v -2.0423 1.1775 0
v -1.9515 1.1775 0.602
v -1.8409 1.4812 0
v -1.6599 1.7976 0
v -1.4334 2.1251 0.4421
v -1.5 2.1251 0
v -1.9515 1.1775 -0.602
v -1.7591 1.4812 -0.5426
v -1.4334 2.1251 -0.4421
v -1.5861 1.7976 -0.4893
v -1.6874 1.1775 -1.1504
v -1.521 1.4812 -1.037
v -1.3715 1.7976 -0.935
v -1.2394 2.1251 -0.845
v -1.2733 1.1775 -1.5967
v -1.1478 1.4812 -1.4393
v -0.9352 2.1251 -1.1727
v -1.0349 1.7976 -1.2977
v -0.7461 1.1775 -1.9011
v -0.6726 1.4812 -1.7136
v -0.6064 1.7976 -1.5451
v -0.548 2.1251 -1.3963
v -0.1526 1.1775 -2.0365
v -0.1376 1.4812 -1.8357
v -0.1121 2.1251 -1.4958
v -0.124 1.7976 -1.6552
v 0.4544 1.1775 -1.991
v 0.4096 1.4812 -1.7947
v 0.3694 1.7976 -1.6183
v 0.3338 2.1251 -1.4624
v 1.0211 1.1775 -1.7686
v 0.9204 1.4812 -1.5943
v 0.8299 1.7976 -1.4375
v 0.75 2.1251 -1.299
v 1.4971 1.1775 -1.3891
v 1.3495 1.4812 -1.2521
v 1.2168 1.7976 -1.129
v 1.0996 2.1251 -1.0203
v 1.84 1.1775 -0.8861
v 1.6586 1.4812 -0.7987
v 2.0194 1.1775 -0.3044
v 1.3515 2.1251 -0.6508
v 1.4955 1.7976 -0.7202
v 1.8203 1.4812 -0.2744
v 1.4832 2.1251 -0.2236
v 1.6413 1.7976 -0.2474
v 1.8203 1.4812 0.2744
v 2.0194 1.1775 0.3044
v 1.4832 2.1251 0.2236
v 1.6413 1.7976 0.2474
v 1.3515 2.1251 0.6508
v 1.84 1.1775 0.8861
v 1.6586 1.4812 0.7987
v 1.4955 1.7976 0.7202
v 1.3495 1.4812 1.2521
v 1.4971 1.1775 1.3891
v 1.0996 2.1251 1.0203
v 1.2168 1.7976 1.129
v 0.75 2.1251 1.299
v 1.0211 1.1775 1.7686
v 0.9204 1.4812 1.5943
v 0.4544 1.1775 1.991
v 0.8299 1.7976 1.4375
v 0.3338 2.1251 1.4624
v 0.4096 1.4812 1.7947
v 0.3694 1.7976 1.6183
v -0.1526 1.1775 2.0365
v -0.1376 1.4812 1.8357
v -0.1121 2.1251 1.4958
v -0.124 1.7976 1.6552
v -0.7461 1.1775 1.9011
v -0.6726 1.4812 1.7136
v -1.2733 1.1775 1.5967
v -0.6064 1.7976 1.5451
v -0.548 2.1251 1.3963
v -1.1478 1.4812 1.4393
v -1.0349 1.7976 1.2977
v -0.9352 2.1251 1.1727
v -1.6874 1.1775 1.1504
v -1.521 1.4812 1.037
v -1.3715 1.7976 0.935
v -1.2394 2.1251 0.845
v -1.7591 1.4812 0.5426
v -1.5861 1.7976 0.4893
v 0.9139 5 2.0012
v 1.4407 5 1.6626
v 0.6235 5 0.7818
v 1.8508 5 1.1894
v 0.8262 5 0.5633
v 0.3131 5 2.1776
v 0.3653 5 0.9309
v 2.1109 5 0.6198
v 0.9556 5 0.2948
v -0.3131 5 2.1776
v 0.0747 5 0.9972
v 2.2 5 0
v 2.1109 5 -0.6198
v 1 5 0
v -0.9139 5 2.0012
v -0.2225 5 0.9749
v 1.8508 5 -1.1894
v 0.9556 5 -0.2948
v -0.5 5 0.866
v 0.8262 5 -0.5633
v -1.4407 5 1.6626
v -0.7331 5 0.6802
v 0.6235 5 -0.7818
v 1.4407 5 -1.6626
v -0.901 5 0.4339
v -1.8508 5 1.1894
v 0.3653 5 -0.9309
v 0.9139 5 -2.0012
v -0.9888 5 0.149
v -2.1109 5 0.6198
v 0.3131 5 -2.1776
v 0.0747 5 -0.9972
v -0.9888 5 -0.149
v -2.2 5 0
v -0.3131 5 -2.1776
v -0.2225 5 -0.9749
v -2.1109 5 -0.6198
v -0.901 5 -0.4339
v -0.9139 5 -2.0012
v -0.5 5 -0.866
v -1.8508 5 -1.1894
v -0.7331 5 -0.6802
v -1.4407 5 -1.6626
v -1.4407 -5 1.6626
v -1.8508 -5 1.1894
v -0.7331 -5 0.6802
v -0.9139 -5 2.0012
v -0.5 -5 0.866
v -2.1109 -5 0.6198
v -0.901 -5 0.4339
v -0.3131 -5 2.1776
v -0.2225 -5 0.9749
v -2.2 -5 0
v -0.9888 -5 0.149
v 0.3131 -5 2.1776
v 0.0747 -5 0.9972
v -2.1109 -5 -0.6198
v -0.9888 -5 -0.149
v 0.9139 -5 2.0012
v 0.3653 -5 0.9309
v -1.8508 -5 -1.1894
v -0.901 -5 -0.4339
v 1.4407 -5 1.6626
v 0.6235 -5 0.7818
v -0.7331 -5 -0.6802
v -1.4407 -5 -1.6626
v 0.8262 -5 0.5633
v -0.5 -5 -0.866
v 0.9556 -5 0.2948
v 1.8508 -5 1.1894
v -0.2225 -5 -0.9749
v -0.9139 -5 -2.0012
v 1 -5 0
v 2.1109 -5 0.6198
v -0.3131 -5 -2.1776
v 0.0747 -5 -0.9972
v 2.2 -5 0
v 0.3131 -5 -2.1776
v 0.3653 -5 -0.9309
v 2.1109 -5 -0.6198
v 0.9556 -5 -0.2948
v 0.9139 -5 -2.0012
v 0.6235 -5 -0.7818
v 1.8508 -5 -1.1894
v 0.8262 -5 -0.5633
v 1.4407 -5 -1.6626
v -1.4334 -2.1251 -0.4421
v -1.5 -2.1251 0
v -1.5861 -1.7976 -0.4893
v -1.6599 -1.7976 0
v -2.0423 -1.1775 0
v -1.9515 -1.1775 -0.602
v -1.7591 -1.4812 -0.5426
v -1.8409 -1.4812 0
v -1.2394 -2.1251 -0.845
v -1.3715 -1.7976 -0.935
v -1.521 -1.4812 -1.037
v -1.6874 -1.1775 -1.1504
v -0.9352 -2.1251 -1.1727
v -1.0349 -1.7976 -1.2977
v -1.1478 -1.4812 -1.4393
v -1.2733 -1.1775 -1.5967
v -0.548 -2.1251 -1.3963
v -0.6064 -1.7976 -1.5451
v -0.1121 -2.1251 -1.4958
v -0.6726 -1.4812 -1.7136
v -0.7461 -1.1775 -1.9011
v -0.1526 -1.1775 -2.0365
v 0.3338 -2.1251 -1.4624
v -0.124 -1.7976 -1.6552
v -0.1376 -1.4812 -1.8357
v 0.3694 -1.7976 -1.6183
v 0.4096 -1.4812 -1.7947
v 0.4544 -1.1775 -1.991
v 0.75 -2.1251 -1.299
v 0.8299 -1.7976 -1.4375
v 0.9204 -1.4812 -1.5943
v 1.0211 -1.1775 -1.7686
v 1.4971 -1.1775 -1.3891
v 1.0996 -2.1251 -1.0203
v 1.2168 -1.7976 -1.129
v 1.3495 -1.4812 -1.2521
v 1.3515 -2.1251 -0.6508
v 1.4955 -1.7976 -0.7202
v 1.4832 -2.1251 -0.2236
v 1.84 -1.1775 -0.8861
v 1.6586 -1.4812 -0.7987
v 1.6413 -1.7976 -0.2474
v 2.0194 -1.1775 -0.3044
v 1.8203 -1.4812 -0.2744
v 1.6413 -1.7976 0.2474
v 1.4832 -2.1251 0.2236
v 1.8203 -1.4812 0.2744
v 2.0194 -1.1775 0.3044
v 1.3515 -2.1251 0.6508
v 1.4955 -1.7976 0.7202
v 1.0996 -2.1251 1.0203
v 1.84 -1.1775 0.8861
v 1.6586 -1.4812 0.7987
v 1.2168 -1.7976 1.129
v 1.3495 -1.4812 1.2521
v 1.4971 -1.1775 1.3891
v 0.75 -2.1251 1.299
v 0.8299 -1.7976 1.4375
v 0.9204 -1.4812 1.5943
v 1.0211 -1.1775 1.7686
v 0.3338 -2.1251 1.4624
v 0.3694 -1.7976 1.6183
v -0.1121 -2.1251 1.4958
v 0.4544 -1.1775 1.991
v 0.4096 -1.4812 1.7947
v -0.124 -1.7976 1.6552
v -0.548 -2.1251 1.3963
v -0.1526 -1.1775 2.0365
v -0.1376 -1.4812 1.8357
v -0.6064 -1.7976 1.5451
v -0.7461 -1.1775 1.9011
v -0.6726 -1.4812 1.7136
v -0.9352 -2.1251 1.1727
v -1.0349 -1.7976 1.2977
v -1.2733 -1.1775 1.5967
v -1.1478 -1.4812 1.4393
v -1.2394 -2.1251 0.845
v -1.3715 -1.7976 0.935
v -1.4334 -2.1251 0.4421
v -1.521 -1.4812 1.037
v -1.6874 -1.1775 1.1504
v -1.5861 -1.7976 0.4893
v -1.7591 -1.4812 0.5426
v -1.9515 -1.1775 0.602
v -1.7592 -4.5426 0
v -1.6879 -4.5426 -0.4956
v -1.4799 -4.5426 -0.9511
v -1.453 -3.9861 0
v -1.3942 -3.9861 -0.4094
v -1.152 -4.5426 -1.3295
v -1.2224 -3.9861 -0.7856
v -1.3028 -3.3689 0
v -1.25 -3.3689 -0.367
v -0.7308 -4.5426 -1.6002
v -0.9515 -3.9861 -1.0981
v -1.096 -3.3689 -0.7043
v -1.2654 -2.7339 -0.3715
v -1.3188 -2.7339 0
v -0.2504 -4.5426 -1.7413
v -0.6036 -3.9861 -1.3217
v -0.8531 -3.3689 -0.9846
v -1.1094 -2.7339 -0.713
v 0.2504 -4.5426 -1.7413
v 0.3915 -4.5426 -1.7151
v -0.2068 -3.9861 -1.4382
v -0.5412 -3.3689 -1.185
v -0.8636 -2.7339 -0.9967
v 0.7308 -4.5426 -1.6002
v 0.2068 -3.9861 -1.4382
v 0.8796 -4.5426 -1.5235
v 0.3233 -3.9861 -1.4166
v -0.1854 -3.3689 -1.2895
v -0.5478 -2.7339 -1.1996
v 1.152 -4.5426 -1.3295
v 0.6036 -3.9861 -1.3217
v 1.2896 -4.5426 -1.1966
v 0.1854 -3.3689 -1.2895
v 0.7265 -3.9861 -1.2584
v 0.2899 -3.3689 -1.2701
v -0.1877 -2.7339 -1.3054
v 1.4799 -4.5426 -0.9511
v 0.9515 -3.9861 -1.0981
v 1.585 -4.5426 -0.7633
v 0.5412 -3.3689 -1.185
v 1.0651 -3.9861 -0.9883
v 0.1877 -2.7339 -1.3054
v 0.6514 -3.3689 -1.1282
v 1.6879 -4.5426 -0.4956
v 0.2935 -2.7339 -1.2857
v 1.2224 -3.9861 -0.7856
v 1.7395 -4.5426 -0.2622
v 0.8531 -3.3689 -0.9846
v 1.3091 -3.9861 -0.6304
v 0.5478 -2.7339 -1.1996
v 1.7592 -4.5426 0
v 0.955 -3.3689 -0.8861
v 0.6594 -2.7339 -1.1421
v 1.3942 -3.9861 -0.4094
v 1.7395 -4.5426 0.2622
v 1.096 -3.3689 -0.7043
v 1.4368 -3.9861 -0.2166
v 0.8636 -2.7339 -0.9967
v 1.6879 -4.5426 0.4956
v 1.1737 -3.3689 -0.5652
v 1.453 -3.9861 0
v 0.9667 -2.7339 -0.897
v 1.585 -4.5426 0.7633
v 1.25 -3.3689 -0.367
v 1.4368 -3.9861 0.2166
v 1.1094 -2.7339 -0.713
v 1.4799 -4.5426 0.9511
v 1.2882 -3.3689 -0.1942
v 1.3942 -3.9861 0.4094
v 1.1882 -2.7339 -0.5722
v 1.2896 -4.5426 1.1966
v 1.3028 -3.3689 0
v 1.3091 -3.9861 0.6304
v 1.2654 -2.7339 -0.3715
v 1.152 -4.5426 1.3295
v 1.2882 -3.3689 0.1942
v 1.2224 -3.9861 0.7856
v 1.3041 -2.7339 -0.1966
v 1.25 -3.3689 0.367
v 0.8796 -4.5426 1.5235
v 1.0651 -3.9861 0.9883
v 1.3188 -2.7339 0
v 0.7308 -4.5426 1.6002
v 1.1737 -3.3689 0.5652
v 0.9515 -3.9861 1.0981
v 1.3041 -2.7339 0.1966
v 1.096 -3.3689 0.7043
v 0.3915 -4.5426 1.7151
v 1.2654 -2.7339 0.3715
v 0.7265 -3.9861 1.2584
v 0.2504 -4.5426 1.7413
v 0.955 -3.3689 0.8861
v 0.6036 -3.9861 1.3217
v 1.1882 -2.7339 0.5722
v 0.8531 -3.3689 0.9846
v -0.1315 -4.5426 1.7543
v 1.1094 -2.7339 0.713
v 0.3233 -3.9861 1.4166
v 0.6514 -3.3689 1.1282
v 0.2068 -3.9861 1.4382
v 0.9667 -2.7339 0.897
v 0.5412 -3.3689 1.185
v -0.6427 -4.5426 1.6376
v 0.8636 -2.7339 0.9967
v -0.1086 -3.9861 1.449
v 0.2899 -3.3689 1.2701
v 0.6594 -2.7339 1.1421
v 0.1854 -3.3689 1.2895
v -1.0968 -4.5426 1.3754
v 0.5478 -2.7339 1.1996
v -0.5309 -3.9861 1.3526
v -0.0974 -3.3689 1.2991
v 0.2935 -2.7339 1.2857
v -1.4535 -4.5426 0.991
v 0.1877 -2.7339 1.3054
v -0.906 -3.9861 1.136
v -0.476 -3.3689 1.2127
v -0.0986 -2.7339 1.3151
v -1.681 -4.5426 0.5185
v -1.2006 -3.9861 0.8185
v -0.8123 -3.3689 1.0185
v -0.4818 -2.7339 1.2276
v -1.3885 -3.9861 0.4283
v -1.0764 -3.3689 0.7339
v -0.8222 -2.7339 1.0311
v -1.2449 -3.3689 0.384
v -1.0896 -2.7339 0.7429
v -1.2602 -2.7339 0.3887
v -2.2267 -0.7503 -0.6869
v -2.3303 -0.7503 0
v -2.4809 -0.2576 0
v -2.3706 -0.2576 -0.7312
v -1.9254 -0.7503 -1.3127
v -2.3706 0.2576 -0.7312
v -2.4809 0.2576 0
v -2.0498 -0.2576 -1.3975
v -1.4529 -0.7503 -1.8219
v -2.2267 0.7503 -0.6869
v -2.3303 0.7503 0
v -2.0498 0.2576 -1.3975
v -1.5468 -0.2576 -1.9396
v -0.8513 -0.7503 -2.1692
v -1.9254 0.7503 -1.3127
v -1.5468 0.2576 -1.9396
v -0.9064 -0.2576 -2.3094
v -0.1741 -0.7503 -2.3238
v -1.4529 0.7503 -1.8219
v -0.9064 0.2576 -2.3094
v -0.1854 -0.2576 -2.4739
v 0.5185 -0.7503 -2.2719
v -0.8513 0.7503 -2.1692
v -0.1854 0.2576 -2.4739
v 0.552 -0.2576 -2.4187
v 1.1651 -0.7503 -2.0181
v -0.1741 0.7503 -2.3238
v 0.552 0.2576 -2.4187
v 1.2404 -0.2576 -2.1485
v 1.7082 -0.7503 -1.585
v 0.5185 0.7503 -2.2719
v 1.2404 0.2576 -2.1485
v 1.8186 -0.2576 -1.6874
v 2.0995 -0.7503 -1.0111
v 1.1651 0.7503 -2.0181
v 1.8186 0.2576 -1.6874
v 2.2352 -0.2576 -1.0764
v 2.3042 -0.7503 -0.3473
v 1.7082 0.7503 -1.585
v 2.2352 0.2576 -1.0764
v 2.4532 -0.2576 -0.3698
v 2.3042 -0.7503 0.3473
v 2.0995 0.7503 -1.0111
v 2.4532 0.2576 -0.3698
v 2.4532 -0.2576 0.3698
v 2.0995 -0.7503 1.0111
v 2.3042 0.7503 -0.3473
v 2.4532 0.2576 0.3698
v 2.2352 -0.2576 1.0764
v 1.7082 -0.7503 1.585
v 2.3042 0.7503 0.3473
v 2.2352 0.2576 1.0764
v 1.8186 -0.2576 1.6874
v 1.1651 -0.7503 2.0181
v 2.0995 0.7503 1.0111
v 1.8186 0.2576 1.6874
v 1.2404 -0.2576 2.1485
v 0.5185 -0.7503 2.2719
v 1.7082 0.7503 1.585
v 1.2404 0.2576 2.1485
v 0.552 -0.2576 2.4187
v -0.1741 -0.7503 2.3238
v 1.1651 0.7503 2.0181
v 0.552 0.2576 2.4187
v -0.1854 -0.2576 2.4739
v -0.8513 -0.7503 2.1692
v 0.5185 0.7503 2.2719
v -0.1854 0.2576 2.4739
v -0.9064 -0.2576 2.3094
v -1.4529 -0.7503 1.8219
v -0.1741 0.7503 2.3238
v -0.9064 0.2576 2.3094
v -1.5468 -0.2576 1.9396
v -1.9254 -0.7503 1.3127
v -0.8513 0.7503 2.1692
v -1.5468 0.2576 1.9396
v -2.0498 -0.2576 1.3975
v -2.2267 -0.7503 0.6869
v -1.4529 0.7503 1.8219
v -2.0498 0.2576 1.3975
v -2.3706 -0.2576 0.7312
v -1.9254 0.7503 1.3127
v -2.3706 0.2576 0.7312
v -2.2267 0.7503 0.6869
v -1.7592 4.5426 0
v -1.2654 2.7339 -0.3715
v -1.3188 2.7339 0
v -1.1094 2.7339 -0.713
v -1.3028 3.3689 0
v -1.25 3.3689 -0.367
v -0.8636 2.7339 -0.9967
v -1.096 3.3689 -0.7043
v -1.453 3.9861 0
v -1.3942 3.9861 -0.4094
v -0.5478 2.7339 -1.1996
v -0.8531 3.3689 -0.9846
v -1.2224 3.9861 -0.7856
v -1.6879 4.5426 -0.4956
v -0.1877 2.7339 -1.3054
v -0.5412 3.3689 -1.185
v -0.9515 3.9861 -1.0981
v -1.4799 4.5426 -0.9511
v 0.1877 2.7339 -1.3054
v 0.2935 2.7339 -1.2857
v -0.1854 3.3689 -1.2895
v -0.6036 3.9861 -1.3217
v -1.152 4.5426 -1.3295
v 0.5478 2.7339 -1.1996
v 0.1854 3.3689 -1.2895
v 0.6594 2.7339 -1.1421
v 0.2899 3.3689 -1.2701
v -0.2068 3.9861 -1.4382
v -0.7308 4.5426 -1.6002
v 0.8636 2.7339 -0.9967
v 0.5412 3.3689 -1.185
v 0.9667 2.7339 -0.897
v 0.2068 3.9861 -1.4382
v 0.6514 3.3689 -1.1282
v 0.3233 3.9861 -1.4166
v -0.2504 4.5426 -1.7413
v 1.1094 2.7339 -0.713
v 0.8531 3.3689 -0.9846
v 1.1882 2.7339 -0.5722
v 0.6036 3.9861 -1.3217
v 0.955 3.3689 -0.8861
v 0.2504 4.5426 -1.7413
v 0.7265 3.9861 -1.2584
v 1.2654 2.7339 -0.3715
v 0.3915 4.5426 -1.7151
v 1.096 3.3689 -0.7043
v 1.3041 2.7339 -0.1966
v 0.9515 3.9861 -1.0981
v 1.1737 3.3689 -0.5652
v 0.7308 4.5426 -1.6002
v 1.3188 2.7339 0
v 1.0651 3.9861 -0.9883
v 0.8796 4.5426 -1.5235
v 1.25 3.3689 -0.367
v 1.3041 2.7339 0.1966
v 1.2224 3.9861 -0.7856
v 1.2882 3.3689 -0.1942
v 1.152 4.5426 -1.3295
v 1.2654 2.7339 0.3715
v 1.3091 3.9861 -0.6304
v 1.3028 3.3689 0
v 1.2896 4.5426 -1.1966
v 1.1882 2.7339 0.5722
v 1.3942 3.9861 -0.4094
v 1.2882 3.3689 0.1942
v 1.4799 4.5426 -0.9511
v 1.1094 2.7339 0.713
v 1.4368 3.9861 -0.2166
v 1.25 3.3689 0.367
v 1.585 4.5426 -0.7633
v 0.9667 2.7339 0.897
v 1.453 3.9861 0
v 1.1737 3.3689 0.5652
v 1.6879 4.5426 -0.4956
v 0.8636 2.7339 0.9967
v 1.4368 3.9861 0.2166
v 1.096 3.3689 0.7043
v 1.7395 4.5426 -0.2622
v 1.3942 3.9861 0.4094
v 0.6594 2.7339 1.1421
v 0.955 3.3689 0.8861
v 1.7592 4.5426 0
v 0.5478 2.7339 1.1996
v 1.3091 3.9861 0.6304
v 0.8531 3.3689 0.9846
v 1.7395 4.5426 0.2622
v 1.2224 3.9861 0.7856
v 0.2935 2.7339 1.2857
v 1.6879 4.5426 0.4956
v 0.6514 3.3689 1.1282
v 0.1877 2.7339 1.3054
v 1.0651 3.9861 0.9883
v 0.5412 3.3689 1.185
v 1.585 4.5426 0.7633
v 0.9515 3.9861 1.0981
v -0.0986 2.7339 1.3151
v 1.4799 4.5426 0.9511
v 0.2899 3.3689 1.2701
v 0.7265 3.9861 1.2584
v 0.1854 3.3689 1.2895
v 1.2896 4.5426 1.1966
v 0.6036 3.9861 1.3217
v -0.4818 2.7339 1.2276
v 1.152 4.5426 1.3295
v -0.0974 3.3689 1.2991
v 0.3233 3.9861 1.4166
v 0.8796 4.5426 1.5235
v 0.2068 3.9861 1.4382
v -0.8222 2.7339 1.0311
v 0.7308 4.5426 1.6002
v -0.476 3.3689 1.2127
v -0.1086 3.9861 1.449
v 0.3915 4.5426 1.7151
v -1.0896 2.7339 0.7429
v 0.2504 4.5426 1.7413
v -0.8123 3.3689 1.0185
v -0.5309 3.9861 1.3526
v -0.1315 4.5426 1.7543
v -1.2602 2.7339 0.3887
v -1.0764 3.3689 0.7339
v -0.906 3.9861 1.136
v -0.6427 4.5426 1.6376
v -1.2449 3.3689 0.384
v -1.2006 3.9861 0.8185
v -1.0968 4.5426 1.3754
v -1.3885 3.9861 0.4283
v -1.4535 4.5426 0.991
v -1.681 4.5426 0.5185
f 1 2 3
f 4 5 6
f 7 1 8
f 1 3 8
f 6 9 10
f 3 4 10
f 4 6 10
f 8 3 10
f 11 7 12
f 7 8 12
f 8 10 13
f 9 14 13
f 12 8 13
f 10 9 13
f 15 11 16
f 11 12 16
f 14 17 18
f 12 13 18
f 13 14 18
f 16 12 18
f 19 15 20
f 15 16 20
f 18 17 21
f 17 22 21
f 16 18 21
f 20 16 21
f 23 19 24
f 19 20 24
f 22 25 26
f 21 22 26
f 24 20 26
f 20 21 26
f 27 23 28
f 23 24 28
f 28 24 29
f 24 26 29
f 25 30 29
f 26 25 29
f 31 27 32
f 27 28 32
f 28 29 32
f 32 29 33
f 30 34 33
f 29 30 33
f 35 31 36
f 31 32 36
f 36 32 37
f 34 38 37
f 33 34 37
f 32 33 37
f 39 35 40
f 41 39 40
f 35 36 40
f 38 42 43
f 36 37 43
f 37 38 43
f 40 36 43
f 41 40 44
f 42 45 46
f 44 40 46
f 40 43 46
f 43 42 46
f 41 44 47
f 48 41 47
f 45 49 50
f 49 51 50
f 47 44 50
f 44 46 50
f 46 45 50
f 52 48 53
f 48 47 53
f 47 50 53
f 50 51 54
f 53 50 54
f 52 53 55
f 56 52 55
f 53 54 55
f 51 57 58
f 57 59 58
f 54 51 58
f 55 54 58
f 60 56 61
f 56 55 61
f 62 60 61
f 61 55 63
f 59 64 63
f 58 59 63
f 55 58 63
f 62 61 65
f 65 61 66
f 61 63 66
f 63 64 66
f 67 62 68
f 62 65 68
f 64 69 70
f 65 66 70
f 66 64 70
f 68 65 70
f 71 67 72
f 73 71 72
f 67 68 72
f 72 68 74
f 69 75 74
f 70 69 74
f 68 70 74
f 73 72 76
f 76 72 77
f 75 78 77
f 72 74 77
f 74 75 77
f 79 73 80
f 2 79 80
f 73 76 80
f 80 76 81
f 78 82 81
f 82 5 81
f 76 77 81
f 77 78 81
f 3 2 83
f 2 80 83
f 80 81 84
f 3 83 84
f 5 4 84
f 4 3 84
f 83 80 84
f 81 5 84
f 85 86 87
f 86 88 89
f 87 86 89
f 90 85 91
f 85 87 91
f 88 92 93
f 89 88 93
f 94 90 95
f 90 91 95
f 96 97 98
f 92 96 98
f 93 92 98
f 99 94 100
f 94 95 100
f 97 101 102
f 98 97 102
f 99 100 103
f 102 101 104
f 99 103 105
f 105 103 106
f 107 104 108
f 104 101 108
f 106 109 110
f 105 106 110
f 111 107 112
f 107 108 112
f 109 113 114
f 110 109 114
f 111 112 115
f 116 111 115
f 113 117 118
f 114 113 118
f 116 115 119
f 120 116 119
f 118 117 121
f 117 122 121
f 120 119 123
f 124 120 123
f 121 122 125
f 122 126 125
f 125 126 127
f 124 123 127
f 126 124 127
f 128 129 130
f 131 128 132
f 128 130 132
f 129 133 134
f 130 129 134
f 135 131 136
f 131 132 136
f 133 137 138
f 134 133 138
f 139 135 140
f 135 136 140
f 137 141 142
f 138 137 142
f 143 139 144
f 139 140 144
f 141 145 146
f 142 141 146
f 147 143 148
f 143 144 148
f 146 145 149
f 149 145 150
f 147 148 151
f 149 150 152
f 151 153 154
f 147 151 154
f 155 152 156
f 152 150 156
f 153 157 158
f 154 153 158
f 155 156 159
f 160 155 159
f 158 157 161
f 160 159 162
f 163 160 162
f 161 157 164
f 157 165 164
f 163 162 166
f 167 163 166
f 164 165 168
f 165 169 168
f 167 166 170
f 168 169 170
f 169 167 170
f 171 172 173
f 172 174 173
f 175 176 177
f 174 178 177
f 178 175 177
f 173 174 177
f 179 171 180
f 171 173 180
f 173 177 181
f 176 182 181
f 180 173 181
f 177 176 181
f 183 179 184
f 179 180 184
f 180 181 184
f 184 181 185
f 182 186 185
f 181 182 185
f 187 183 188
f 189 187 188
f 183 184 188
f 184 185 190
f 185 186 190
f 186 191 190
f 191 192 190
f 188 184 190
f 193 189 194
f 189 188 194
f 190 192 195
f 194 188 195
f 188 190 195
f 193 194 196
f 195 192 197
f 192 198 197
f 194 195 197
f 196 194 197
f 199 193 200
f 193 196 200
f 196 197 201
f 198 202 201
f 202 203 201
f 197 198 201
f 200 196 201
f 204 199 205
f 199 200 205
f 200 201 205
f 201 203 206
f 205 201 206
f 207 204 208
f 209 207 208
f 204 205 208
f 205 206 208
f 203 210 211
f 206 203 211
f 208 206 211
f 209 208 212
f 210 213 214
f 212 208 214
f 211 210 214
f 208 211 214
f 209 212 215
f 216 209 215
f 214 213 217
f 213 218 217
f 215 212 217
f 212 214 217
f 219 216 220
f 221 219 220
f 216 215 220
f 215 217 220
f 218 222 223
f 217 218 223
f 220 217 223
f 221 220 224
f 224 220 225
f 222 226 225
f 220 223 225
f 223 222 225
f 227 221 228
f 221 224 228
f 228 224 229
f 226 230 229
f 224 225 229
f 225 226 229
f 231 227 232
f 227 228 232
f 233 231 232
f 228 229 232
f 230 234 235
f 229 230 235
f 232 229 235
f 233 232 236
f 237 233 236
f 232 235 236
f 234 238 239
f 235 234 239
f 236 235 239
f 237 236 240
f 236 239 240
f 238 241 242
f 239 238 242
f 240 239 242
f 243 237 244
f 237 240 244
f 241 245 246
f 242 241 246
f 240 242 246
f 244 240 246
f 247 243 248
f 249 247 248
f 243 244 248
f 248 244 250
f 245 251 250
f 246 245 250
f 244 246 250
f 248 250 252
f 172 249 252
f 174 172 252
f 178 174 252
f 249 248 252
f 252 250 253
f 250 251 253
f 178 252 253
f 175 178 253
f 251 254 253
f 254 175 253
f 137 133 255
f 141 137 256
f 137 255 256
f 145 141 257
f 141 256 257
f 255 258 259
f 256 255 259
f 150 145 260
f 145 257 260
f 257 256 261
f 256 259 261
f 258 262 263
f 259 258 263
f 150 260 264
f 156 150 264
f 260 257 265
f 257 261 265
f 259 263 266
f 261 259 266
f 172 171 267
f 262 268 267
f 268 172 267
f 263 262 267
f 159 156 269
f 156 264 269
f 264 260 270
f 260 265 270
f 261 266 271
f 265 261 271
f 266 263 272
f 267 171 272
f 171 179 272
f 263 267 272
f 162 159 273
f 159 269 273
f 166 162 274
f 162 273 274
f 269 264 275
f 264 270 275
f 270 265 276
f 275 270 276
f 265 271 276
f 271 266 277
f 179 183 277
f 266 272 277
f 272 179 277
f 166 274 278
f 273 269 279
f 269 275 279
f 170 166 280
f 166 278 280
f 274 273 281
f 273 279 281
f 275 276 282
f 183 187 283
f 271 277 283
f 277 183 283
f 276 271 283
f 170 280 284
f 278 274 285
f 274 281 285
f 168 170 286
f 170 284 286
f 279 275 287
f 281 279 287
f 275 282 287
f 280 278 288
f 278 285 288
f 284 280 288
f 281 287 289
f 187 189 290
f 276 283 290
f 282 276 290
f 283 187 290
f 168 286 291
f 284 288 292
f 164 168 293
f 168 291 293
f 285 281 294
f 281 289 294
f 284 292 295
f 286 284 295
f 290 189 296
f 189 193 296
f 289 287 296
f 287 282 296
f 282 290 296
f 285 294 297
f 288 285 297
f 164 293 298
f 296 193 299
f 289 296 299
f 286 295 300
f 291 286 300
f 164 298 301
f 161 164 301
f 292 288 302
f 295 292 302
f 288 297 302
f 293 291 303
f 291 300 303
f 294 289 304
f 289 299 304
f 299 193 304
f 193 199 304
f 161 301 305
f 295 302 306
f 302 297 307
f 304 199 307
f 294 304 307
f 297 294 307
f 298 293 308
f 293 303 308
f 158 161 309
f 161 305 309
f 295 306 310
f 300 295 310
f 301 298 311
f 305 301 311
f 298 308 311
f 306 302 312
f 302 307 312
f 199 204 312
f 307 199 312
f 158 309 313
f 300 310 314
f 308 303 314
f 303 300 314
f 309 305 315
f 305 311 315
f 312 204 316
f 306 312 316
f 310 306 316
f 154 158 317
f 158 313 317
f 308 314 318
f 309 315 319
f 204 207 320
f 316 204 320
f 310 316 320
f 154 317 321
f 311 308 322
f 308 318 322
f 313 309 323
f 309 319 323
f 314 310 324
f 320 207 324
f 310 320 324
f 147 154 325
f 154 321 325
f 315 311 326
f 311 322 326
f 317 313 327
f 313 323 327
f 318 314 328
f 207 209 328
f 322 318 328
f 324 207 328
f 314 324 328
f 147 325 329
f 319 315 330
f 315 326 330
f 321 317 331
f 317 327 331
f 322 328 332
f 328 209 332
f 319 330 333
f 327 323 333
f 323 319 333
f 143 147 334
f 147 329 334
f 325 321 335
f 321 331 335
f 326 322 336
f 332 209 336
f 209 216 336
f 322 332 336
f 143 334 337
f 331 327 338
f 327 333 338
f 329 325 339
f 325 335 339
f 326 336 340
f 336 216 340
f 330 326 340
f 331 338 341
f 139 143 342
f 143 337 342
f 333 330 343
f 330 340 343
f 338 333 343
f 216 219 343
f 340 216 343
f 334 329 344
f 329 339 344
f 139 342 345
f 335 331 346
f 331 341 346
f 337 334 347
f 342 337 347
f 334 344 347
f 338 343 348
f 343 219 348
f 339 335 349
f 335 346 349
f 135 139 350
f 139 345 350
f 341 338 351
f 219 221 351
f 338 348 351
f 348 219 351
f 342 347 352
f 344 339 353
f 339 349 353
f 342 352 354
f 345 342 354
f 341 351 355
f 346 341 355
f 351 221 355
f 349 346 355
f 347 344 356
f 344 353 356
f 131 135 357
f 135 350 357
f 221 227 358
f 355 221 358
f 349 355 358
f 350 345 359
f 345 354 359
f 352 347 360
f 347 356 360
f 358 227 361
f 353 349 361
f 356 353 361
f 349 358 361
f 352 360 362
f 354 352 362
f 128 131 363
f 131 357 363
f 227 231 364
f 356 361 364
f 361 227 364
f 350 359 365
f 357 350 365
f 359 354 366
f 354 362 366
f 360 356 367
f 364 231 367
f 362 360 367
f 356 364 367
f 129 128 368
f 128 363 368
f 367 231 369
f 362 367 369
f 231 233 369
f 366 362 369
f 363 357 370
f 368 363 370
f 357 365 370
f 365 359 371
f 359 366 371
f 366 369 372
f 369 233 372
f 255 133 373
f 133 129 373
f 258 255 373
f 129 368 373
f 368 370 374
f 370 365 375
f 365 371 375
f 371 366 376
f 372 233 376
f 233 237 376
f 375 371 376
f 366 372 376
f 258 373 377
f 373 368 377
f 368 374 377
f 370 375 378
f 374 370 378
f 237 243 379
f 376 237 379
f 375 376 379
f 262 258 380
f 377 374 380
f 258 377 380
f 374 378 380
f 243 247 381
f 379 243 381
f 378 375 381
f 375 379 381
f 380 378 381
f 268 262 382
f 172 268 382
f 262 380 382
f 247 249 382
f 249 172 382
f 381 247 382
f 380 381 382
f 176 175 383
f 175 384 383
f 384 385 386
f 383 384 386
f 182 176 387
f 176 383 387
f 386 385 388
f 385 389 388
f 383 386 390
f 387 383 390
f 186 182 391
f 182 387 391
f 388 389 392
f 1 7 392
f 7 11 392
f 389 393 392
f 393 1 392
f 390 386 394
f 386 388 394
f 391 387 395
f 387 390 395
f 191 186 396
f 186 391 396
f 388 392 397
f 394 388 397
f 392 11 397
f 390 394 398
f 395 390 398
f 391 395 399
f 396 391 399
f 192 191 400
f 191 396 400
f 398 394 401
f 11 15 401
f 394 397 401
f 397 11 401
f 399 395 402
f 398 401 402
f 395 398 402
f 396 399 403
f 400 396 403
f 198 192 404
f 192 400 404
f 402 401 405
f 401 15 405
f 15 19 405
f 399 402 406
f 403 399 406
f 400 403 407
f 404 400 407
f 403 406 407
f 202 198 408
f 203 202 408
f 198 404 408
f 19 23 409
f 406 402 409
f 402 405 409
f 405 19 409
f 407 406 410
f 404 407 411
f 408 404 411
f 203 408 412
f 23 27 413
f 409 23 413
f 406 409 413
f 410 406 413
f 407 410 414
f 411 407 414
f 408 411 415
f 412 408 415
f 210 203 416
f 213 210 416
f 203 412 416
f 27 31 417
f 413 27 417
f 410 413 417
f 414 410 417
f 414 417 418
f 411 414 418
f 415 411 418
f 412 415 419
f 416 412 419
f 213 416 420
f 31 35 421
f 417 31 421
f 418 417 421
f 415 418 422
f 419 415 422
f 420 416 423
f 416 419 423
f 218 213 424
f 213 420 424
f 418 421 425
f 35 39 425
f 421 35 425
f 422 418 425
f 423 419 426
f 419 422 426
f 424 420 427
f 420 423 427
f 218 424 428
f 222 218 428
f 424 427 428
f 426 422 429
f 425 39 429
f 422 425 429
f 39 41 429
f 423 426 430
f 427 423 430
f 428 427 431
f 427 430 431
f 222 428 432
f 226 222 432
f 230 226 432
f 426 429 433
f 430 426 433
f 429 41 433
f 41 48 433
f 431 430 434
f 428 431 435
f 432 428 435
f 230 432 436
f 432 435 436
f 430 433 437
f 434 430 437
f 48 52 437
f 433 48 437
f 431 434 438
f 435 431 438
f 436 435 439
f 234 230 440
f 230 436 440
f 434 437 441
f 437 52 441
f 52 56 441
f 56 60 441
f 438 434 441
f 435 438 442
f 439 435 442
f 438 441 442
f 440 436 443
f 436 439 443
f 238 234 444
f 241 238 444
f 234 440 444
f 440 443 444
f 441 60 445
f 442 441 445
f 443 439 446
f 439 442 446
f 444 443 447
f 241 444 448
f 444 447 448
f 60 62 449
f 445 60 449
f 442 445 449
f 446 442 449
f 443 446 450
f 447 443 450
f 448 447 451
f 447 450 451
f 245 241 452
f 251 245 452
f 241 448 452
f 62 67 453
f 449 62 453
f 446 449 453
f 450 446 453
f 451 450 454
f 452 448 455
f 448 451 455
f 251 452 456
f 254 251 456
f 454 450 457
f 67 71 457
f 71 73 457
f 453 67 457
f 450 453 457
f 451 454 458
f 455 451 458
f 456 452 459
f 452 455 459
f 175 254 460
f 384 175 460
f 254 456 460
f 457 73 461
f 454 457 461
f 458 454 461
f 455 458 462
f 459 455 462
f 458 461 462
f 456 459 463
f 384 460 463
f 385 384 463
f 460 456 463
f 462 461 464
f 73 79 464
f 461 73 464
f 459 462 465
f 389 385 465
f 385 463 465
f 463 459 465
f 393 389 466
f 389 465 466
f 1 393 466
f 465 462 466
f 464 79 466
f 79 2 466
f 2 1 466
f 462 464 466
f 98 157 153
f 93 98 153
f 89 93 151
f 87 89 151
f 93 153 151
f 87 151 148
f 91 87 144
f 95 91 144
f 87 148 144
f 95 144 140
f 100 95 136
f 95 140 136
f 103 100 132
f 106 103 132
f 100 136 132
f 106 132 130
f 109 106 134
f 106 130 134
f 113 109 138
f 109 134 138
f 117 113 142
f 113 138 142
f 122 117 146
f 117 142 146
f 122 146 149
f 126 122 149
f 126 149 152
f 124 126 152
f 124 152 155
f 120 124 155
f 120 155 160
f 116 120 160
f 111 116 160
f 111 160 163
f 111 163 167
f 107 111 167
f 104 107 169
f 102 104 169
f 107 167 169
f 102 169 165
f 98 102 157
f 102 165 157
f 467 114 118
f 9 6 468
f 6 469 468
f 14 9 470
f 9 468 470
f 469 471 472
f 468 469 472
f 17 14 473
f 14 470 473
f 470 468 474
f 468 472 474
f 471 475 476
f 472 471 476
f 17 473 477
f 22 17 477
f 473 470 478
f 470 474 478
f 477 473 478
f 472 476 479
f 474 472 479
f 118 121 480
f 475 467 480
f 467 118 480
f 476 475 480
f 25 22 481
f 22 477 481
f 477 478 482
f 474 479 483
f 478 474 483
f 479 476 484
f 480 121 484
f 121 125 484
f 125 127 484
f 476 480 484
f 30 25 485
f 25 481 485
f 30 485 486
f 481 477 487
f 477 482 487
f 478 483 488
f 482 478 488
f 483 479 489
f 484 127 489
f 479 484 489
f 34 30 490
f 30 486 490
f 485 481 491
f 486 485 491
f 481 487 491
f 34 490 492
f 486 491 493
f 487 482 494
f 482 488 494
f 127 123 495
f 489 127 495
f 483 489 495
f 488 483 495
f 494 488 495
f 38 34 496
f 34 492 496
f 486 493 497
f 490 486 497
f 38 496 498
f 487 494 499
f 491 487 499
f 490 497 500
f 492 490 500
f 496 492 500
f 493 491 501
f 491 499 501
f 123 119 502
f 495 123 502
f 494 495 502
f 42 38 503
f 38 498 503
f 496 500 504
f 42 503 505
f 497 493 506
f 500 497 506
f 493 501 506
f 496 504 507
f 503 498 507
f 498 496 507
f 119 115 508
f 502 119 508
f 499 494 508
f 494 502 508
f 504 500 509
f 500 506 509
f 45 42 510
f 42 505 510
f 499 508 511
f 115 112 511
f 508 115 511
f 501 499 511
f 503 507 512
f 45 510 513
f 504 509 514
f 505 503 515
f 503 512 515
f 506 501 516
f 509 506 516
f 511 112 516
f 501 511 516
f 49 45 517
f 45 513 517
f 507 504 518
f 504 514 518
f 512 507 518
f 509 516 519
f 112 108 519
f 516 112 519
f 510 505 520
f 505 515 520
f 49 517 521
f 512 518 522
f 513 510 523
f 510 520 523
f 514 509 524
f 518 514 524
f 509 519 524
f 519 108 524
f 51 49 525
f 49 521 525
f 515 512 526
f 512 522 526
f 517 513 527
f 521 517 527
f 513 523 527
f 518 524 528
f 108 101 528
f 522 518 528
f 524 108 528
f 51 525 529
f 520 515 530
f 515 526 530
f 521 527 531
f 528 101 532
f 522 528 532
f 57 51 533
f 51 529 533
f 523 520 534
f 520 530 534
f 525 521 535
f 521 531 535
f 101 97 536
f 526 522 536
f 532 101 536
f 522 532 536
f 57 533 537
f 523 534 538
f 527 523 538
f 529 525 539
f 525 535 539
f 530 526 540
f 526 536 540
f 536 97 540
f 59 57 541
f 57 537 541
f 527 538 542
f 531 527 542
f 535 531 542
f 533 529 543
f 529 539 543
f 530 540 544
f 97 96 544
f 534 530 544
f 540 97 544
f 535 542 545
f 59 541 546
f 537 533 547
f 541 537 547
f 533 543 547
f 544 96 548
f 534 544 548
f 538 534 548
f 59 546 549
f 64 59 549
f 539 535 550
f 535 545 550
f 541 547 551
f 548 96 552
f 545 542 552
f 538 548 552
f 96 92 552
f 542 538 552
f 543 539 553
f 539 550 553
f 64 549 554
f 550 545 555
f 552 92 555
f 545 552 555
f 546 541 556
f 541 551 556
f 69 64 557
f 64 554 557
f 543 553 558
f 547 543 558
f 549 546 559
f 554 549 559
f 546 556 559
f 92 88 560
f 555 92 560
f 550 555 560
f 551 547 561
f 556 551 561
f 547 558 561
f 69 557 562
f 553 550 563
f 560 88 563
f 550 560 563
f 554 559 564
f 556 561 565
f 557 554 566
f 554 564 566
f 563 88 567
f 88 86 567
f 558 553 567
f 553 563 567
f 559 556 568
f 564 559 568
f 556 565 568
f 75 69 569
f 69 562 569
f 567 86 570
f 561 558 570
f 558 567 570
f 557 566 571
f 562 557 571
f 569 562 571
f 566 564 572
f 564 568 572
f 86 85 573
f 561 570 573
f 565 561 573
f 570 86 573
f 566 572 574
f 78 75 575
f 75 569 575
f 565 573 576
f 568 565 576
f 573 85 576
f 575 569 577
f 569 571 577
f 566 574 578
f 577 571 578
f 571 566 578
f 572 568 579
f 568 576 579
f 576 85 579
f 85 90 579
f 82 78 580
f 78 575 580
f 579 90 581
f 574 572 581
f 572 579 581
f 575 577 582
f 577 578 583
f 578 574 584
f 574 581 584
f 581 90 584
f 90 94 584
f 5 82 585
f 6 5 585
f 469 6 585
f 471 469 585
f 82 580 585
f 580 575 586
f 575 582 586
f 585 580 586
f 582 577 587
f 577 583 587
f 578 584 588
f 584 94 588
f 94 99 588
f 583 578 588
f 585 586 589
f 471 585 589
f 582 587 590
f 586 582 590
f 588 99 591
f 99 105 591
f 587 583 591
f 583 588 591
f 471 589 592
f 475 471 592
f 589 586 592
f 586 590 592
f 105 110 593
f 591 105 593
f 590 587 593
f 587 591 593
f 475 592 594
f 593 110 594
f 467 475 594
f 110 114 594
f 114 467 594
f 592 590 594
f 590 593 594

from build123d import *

# Parameters (mm, degrees)
ESQUISSE5_R             = 1
ENL_V_MAT_EXTRU_2_DEPTH = 10


with BuildPart() as part:
    # Esquisse1 → Révolution2 (revolve)
    with BuildSketch(Plane.XY):
        with BuildLine():
            Line((0, 5), (0, -5))
            Line((0, -5), (-2.2, -5))
            ThreePointArc((-2.2, -5), (-1.357495617, -3.68245461), (-1.5, -2.125074762))
            ThreePointArc((-1.5, -2.125074762), (-1.747791972, -1.637919756), (-2.042253504, -1.177470772))
            ThreePointArc((-2.042253504, -1.177470772), (-2.5, 0), (-2.042253504, 1.177470772))
            ThreePointArc((-2.042253504, 1.177470772), (-1.747791972, 1.637919756), (-1.5, 2.125074762))
            ThreePointArc((-1.5, 2.125074762), (-1.357495617, 3.68245461), (-2.2, 5))
            Line((-2.2, 5), (0, 5))
        make_face()
    revolve(axis=Axis((0, -2, 0), (0, -1, 0)))

    # Esquisse5 → Enlèv. mat.-Extru.2 (cut)
    with BuildSketch(Plane(origin=(0, -5, 0), x_dir=(-1, 0, 0), z_dir=(0, -1, 0))):
        with Locations(Location((0, 0, 0), (0, 0, 180))):
            Circle(ESQUISSE5_R)
    extrude(amount=-ENL_V_MAT_EXTRU_2_DEPTH, mode=Mode.SUBTRACT)


solid = part.part
